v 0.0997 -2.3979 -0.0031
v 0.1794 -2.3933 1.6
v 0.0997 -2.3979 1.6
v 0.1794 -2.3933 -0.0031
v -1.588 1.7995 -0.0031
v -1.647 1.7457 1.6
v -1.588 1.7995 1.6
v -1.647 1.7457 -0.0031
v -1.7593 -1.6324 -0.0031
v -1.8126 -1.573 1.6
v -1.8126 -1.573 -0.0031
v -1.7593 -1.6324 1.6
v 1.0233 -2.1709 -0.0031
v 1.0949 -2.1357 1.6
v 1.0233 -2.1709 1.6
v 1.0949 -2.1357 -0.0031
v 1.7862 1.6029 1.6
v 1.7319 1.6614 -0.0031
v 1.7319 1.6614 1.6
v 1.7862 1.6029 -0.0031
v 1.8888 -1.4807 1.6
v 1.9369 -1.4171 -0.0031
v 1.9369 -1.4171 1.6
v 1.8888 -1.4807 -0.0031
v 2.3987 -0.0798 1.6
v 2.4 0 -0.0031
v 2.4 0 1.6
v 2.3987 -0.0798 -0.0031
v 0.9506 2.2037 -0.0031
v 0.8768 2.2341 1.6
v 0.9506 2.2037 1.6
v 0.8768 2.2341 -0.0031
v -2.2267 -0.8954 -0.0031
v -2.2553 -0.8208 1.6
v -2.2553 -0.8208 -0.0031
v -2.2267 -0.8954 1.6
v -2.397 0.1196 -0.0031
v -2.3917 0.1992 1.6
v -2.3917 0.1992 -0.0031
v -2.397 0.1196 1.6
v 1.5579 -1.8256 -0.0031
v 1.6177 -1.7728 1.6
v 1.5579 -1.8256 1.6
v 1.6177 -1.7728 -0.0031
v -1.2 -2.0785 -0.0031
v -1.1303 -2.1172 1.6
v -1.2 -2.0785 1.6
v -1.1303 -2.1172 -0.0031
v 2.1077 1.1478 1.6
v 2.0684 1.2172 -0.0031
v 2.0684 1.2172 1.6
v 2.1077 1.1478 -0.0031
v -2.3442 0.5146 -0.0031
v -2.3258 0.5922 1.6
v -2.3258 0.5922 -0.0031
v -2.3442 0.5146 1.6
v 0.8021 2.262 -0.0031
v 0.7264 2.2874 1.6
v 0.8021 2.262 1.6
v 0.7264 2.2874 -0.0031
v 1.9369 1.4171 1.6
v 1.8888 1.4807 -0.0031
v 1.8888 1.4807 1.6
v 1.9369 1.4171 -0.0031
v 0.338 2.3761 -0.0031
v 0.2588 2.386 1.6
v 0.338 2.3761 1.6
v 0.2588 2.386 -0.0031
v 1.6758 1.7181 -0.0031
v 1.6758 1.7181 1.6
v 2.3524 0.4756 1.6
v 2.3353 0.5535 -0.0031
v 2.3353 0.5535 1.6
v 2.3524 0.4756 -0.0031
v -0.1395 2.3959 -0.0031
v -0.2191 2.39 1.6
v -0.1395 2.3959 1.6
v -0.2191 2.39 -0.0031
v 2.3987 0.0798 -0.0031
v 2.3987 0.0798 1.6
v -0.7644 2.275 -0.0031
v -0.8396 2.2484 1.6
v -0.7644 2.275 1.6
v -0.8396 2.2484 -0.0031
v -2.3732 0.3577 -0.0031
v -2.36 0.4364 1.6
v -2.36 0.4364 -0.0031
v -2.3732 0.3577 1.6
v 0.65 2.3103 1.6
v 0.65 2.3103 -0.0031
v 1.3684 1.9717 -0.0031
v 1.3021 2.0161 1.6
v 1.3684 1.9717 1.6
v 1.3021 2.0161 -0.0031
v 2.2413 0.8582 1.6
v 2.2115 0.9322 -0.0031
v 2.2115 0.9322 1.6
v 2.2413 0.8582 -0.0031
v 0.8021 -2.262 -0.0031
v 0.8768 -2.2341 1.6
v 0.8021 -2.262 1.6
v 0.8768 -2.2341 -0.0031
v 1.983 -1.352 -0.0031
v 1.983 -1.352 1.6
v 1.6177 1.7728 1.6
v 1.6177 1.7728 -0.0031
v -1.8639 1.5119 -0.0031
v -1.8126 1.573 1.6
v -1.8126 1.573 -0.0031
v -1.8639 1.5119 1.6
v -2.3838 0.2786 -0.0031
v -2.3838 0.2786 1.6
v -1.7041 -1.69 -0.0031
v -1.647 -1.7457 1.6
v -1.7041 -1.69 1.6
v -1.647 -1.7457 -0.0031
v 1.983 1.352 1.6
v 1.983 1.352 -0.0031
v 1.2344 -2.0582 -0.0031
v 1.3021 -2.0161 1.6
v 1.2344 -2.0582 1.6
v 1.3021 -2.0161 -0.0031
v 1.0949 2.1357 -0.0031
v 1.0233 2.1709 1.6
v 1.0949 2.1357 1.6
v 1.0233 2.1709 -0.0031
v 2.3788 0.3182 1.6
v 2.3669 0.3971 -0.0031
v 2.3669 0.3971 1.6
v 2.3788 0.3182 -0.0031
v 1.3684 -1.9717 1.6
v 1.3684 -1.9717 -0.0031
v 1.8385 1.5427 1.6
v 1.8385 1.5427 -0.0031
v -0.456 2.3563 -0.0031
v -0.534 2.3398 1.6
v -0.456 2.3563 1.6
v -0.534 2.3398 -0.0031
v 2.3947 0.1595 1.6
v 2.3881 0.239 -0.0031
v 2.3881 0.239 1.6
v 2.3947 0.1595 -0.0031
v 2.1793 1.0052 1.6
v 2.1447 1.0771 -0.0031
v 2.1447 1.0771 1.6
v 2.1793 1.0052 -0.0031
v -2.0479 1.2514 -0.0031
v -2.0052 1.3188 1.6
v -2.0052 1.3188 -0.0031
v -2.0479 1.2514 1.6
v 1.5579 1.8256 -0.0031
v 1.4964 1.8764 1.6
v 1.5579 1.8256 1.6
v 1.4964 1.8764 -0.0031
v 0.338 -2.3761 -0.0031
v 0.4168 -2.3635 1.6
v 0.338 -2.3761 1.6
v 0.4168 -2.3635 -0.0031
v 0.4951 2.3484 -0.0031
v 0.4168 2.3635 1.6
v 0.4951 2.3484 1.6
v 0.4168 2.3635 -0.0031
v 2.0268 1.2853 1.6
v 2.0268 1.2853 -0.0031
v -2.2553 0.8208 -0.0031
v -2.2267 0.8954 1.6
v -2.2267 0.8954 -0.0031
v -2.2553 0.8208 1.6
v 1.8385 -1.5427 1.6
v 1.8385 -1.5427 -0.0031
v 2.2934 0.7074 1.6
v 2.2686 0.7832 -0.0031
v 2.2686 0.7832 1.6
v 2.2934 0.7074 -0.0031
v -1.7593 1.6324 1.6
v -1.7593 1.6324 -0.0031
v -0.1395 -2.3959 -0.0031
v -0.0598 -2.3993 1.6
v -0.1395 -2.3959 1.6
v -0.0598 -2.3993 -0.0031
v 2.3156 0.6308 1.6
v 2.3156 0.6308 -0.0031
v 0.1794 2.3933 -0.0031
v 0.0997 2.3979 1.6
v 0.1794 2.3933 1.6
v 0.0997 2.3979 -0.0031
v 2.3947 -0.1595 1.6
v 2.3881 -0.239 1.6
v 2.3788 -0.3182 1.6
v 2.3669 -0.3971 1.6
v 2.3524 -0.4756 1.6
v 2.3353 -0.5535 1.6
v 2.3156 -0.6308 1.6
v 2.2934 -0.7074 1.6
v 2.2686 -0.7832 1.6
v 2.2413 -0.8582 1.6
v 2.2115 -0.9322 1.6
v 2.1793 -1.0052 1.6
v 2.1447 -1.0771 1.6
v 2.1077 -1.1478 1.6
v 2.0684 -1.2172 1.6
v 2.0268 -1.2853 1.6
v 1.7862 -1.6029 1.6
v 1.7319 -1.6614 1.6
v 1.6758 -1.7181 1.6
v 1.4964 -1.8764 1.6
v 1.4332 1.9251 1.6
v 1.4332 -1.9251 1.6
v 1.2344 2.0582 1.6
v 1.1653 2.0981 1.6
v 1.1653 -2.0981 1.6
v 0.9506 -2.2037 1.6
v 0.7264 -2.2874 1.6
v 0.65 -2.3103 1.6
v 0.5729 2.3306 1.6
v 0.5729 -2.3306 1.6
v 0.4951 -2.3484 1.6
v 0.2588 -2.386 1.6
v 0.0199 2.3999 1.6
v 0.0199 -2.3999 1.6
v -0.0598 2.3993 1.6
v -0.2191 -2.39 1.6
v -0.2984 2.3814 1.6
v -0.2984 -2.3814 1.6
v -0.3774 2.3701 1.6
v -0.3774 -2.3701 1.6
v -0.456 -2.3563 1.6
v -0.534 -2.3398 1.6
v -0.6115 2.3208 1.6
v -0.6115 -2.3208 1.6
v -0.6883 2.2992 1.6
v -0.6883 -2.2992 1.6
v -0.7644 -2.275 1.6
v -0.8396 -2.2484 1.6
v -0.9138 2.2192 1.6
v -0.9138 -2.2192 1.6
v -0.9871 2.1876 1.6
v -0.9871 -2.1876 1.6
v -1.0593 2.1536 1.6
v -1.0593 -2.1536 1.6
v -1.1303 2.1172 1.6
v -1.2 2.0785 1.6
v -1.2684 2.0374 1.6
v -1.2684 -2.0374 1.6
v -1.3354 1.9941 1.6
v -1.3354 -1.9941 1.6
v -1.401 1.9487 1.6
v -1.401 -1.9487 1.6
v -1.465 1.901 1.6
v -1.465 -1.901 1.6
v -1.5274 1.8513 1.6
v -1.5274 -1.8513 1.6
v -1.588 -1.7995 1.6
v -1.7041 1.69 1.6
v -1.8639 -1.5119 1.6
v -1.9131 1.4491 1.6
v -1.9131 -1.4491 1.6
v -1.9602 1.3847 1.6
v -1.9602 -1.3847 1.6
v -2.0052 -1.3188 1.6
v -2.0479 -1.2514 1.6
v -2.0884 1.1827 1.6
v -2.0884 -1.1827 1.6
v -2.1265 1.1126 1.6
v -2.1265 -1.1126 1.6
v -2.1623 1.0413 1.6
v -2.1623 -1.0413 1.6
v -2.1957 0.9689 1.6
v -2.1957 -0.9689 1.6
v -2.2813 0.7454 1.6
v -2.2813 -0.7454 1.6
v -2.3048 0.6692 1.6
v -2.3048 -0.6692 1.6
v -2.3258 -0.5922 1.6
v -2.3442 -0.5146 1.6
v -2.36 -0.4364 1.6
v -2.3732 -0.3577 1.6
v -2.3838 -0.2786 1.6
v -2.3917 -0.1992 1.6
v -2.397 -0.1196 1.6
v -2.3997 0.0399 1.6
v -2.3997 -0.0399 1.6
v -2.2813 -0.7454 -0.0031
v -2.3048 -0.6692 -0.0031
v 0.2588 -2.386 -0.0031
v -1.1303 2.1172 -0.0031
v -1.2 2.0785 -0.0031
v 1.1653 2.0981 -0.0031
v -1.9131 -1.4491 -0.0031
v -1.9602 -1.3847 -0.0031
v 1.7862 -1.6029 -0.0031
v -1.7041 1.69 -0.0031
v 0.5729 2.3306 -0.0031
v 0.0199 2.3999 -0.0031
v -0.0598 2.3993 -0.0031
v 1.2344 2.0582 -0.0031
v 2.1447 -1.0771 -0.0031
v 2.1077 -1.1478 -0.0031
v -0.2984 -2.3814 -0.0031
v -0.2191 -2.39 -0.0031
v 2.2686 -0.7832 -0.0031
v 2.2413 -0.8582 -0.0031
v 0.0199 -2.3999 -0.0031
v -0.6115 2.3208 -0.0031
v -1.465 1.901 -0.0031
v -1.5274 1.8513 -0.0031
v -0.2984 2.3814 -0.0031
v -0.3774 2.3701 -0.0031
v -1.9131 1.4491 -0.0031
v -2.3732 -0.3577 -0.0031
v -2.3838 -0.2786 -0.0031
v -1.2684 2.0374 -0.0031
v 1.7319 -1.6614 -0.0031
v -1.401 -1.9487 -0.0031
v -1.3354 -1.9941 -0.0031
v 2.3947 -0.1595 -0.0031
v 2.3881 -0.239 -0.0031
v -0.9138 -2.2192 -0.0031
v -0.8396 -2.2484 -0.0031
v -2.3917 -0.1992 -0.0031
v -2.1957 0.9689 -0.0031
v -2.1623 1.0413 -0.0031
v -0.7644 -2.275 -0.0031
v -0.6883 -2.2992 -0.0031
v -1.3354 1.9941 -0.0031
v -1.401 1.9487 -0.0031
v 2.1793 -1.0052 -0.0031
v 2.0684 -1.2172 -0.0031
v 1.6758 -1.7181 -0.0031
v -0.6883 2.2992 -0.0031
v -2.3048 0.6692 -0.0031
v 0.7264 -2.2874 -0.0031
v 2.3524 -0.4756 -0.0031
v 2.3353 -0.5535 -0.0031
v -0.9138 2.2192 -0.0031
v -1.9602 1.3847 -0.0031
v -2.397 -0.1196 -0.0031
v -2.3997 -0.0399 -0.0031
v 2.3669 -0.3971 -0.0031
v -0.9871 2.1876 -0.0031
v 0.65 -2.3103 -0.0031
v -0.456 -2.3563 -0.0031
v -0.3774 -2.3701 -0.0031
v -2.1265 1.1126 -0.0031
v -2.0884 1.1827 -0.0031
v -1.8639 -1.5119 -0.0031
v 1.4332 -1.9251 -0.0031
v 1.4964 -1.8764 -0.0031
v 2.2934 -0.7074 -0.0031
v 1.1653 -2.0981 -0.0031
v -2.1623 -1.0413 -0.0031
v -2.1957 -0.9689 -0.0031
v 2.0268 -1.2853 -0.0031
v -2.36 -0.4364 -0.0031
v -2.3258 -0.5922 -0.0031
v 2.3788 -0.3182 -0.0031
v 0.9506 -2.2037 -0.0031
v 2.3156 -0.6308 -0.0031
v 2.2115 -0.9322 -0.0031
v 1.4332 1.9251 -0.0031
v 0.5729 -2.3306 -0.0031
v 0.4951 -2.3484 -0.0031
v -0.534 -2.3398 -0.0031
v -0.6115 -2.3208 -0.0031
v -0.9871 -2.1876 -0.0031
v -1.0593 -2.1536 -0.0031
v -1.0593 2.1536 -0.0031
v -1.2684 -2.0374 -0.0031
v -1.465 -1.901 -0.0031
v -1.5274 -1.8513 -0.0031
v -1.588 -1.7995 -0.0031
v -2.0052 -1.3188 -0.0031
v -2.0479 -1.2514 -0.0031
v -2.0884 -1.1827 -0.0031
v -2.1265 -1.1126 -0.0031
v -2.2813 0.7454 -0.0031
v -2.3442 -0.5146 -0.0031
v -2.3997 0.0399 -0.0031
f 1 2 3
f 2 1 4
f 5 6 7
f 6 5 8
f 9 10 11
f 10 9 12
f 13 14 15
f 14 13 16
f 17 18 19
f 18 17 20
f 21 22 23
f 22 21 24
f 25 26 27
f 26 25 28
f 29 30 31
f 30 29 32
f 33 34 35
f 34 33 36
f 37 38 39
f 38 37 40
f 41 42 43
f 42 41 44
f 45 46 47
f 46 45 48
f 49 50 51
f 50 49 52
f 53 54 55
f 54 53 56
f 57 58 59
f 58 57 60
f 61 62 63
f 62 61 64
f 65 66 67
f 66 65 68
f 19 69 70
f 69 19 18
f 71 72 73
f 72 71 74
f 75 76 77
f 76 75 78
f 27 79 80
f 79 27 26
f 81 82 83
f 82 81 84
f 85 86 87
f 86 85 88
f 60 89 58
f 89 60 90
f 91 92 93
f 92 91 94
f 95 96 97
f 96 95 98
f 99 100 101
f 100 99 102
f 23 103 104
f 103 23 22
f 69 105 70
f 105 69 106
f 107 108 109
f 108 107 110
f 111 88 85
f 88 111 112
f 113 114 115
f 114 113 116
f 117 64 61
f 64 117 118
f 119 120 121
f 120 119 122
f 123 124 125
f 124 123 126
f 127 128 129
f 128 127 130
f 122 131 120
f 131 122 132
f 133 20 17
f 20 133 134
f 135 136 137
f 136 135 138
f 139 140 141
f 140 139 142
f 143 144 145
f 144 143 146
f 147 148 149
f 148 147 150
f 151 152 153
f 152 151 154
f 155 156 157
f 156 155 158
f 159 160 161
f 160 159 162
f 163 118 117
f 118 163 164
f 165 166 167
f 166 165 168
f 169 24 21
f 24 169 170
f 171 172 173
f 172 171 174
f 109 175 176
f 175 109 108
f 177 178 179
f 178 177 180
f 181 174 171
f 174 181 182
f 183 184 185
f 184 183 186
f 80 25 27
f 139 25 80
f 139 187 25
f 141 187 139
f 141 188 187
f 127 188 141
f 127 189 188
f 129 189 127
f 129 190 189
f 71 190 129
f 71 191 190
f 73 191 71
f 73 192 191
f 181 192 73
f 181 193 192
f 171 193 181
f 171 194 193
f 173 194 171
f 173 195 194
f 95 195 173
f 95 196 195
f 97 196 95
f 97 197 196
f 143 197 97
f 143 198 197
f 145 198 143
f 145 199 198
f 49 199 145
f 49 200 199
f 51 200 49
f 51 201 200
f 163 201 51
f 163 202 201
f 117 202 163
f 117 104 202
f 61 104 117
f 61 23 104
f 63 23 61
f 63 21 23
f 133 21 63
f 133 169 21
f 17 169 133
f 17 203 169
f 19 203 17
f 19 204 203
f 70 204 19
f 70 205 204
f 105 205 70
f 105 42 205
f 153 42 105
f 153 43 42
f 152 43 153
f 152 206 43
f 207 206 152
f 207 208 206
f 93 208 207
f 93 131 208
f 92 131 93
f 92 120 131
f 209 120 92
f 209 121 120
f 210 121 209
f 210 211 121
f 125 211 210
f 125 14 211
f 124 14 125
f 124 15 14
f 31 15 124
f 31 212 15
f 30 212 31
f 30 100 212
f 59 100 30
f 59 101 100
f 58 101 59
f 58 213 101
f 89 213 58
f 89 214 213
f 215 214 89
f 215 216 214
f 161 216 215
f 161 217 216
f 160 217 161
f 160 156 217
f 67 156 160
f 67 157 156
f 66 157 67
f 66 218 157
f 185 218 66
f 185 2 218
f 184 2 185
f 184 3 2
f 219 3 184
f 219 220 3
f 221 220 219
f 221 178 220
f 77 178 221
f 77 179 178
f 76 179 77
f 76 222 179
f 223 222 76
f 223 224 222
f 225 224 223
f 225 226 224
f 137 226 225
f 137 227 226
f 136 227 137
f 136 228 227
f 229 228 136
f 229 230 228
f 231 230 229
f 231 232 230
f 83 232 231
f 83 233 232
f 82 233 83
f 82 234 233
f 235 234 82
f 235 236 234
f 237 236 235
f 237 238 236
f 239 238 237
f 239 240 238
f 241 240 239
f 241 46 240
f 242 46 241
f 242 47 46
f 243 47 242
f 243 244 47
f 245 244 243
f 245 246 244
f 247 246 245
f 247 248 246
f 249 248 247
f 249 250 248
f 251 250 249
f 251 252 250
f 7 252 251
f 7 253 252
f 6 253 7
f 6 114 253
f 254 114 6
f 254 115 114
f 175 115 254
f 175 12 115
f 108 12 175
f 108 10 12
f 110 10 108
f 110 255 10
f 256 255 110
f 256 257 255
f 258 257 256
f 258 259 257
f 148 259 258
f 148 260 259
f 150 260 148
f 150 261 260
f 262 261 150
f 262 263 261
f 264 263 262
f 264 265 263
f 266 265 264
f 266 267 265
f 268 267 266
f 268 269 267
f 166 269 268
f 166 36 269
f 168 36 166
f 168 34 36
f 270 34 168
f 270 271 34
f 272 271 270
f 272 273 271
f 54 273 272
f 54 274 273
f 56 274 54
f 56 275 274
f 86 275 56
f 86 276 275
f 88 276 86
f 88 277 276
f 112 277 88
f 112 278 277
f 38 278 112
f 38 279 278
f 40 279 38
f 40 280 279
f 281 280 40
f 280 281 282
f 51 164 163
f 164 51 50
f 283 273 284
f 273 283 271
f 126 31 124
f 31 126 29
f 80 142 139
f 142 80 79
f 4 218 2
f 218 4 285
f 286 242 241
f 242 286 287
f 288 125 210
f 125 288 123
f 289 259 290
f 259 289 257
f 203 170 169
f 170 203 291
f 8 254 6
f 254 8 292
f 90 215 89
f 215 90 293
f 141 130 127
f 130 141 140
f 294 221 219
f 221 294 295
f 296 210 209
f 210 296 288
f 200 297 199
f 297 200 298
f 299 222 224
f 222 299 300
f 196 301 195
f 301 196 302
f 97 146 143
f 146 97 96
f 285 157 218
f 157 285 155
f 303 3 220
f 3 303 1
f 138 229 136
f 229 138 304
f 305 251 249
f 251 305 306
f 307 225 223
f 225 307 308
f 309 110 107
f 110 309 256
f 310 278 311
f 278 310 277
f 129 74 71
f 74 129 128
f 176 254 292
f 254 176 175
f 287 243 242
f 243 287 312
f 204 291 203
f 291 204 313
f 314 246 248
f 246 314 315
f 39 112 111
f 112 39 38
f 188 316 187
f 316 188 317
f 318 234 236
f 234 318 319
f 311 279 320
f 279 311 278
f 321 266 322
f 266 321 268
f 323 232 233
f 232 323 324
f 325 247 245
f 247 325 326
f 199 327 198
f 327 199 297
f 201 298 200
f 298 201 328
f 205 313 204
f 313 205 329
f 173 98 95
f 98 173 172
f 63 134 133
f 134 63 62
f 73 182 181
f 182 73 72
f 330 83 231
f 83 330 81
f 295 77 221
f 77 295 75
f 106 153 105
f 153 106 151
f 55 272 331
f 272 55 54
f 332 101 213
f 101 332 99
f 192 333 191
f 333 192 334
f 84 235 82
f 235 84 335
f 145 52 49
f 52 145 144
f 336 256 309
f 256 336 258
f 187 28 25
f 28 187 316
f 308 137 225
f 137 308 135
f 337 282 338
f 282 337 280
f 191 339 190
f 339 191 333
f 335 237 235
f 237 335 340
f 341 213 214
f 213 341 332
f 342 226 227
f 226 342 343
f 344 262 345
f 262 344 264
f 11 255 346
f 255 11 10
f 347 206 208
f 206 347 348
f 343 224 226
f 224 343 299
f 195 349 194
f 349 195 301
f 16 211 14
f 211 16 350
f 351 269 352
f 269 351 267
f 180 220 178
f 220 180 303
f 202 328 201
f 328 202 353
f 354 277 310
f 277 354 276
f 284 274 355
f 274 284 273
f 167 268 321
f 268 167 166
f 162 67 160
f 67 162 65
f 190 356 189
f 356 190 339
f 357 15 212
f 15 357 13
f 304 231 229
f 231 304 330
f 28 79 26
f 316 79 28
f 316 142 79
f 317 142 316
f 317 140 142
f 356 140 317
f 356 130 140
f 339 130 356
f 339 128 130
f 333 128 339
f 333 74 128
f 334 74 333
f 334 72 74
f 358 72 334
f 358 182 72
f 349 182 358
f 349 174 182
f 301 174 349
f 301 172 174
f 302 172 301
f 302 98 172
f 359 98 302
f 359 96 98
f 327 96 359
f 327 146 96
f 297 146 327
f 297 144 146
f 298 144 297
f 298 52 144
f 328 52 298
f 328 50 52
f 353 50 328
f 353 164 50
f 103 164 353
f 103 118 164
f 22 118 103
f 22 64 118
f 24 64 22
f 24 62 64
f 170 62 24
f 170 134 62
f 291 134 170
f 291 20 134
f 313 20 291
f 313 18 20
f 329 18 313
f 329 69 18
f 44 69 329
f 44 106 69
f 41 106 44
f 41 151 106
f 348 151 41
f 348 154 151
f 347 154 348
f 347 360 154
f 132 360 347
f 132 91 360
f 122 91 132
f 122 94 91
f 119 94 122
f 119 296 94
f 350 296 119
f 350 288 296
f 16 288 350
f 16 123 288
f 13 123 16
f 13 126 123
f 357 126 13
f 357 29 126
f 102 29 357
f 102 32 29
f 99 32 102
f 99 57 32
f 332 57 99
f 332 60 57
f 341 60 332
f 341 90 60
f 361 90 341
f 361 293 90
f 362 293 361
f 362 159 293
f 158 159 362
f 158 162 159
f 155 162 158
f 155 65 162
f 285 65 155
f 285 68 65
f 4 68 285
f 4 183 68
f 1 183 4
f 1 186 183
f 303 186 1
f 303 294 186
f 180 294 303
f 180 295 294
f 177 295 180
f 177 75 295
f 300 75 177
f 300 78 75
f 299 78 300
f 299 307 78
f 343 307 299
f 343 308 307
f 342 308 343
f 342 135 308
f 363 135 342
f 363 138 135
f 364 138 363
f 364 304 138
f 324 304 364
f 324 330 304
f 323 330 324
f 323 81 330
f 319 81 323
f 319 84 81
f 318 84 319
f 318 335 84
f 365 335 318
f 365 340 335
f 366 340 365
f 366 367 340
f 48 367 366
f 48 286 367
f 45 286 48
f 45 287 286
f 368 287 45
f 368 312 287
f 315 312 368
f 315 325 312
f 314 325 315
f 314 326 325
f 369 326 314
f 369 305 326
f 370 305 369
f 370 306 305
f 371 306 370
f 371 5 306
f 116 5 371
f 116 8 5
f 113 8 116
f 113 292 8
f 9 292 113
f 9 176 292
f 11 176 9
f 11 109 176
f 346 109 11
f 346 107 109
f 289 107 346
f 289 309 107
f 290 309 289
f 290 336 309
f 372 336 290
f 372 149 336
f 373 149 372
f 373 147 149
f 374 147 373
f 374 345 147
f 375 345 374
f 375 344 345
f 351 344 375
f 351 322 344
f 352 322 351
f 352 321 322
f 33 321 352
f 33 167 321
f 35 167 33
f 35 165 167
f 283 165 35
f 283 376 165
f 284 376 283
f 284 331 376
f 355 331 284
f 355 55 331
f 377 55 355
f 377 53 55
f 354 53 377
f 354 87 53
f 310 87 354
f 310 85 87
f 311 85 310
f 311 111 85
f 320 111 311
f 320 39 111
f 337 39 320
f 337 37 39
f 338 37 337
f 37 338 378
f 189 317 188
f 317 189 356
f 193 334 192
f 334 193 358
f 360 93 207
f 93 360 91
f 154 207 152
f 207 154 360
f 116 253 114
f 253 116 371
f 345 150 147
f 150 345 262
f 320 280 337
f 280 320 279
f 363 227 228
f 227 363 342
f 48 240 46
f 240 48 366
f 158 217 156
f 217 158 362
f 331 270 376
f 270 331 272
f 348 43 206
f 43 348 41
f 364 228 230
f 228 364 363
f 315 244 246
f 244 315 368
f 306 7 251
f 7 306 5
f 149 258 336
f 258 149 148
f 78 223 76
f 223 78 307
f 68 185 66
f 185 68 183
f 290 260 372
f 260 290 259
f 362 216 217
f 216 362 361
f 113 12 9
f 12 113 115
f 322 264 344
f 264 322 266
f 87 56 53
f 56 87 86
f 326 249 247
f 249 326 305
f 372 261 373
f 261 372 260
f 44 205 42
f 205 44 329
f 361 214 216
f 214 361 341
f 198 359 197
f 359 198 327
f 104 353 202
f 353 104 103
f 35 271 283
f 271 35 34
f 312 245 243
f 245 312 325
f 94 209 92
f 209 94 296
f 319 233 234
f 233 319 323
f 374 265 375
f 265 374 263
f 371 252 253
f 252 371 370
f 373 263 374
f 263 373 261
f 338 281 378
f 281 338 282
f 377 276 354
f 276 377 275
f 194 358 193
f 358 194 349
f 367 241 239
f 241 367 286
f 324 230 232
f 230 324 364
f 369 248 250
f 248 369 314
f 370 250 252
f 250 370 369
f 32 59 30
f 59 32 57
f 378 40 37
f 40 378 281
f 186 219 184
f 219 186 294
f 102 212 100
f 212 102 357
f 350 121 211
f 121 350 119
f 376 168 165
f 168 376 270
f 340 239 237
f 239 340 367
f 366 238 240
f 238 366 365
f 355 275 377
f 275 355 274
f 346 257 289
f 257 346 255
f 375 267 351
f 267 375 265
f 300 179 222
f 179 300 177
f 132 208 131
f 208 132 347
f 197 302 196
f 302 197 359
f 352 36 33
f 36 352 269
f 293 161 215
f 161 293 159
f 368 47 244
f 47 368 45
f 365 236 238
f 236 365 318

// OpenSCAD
use <../lib.scad>
use <60583a.scad>
$fa=1; $fs=0.2;
function ldraw_lib__60801(realsolid=false) = [
// 0 =Brick  1 x  1 x  3 with Two Clips Vertical and Solid Stud
// 0 Name: 60801.dat
// 0 Author: Willy Tschager [Holly-Wood]
// 0 !LDRAW_ORG Part Alias UPDATE 2020-03
// 0 !LICENSE Licensed under CC BY 2.0 and CC BY 4.0 : see CAreadme.txt
// 
// 0 BFC CERTIFY CCW
  [0,"BFC","CERTIFY"],
  [0,"BFC","CCW"],
// 
// 0 !HISTORY 2020-12-29 [PTadmin] Official Update 2020-03
// 
// 
// 0 // Alias of 60583a
// 1 16 0 0 0 1 0 0 0 1 0 0 0 1 60583a.dat
  [1,16,0,0,0,1,0,0,0,1,0,0,0,1, ldraw_lib__60583a(realsolid)],
];
module ldraw_lib__60801(step=0, col=false, unit=2/5, alt=false, line=0.2, solid=!$preview)
    makepoly(ldraw_lib__60801(solid), step=step, col=col, unit=unit, alt=alt, line=line, solid=solid);
ldraw_lib__60801(line=0.2);
